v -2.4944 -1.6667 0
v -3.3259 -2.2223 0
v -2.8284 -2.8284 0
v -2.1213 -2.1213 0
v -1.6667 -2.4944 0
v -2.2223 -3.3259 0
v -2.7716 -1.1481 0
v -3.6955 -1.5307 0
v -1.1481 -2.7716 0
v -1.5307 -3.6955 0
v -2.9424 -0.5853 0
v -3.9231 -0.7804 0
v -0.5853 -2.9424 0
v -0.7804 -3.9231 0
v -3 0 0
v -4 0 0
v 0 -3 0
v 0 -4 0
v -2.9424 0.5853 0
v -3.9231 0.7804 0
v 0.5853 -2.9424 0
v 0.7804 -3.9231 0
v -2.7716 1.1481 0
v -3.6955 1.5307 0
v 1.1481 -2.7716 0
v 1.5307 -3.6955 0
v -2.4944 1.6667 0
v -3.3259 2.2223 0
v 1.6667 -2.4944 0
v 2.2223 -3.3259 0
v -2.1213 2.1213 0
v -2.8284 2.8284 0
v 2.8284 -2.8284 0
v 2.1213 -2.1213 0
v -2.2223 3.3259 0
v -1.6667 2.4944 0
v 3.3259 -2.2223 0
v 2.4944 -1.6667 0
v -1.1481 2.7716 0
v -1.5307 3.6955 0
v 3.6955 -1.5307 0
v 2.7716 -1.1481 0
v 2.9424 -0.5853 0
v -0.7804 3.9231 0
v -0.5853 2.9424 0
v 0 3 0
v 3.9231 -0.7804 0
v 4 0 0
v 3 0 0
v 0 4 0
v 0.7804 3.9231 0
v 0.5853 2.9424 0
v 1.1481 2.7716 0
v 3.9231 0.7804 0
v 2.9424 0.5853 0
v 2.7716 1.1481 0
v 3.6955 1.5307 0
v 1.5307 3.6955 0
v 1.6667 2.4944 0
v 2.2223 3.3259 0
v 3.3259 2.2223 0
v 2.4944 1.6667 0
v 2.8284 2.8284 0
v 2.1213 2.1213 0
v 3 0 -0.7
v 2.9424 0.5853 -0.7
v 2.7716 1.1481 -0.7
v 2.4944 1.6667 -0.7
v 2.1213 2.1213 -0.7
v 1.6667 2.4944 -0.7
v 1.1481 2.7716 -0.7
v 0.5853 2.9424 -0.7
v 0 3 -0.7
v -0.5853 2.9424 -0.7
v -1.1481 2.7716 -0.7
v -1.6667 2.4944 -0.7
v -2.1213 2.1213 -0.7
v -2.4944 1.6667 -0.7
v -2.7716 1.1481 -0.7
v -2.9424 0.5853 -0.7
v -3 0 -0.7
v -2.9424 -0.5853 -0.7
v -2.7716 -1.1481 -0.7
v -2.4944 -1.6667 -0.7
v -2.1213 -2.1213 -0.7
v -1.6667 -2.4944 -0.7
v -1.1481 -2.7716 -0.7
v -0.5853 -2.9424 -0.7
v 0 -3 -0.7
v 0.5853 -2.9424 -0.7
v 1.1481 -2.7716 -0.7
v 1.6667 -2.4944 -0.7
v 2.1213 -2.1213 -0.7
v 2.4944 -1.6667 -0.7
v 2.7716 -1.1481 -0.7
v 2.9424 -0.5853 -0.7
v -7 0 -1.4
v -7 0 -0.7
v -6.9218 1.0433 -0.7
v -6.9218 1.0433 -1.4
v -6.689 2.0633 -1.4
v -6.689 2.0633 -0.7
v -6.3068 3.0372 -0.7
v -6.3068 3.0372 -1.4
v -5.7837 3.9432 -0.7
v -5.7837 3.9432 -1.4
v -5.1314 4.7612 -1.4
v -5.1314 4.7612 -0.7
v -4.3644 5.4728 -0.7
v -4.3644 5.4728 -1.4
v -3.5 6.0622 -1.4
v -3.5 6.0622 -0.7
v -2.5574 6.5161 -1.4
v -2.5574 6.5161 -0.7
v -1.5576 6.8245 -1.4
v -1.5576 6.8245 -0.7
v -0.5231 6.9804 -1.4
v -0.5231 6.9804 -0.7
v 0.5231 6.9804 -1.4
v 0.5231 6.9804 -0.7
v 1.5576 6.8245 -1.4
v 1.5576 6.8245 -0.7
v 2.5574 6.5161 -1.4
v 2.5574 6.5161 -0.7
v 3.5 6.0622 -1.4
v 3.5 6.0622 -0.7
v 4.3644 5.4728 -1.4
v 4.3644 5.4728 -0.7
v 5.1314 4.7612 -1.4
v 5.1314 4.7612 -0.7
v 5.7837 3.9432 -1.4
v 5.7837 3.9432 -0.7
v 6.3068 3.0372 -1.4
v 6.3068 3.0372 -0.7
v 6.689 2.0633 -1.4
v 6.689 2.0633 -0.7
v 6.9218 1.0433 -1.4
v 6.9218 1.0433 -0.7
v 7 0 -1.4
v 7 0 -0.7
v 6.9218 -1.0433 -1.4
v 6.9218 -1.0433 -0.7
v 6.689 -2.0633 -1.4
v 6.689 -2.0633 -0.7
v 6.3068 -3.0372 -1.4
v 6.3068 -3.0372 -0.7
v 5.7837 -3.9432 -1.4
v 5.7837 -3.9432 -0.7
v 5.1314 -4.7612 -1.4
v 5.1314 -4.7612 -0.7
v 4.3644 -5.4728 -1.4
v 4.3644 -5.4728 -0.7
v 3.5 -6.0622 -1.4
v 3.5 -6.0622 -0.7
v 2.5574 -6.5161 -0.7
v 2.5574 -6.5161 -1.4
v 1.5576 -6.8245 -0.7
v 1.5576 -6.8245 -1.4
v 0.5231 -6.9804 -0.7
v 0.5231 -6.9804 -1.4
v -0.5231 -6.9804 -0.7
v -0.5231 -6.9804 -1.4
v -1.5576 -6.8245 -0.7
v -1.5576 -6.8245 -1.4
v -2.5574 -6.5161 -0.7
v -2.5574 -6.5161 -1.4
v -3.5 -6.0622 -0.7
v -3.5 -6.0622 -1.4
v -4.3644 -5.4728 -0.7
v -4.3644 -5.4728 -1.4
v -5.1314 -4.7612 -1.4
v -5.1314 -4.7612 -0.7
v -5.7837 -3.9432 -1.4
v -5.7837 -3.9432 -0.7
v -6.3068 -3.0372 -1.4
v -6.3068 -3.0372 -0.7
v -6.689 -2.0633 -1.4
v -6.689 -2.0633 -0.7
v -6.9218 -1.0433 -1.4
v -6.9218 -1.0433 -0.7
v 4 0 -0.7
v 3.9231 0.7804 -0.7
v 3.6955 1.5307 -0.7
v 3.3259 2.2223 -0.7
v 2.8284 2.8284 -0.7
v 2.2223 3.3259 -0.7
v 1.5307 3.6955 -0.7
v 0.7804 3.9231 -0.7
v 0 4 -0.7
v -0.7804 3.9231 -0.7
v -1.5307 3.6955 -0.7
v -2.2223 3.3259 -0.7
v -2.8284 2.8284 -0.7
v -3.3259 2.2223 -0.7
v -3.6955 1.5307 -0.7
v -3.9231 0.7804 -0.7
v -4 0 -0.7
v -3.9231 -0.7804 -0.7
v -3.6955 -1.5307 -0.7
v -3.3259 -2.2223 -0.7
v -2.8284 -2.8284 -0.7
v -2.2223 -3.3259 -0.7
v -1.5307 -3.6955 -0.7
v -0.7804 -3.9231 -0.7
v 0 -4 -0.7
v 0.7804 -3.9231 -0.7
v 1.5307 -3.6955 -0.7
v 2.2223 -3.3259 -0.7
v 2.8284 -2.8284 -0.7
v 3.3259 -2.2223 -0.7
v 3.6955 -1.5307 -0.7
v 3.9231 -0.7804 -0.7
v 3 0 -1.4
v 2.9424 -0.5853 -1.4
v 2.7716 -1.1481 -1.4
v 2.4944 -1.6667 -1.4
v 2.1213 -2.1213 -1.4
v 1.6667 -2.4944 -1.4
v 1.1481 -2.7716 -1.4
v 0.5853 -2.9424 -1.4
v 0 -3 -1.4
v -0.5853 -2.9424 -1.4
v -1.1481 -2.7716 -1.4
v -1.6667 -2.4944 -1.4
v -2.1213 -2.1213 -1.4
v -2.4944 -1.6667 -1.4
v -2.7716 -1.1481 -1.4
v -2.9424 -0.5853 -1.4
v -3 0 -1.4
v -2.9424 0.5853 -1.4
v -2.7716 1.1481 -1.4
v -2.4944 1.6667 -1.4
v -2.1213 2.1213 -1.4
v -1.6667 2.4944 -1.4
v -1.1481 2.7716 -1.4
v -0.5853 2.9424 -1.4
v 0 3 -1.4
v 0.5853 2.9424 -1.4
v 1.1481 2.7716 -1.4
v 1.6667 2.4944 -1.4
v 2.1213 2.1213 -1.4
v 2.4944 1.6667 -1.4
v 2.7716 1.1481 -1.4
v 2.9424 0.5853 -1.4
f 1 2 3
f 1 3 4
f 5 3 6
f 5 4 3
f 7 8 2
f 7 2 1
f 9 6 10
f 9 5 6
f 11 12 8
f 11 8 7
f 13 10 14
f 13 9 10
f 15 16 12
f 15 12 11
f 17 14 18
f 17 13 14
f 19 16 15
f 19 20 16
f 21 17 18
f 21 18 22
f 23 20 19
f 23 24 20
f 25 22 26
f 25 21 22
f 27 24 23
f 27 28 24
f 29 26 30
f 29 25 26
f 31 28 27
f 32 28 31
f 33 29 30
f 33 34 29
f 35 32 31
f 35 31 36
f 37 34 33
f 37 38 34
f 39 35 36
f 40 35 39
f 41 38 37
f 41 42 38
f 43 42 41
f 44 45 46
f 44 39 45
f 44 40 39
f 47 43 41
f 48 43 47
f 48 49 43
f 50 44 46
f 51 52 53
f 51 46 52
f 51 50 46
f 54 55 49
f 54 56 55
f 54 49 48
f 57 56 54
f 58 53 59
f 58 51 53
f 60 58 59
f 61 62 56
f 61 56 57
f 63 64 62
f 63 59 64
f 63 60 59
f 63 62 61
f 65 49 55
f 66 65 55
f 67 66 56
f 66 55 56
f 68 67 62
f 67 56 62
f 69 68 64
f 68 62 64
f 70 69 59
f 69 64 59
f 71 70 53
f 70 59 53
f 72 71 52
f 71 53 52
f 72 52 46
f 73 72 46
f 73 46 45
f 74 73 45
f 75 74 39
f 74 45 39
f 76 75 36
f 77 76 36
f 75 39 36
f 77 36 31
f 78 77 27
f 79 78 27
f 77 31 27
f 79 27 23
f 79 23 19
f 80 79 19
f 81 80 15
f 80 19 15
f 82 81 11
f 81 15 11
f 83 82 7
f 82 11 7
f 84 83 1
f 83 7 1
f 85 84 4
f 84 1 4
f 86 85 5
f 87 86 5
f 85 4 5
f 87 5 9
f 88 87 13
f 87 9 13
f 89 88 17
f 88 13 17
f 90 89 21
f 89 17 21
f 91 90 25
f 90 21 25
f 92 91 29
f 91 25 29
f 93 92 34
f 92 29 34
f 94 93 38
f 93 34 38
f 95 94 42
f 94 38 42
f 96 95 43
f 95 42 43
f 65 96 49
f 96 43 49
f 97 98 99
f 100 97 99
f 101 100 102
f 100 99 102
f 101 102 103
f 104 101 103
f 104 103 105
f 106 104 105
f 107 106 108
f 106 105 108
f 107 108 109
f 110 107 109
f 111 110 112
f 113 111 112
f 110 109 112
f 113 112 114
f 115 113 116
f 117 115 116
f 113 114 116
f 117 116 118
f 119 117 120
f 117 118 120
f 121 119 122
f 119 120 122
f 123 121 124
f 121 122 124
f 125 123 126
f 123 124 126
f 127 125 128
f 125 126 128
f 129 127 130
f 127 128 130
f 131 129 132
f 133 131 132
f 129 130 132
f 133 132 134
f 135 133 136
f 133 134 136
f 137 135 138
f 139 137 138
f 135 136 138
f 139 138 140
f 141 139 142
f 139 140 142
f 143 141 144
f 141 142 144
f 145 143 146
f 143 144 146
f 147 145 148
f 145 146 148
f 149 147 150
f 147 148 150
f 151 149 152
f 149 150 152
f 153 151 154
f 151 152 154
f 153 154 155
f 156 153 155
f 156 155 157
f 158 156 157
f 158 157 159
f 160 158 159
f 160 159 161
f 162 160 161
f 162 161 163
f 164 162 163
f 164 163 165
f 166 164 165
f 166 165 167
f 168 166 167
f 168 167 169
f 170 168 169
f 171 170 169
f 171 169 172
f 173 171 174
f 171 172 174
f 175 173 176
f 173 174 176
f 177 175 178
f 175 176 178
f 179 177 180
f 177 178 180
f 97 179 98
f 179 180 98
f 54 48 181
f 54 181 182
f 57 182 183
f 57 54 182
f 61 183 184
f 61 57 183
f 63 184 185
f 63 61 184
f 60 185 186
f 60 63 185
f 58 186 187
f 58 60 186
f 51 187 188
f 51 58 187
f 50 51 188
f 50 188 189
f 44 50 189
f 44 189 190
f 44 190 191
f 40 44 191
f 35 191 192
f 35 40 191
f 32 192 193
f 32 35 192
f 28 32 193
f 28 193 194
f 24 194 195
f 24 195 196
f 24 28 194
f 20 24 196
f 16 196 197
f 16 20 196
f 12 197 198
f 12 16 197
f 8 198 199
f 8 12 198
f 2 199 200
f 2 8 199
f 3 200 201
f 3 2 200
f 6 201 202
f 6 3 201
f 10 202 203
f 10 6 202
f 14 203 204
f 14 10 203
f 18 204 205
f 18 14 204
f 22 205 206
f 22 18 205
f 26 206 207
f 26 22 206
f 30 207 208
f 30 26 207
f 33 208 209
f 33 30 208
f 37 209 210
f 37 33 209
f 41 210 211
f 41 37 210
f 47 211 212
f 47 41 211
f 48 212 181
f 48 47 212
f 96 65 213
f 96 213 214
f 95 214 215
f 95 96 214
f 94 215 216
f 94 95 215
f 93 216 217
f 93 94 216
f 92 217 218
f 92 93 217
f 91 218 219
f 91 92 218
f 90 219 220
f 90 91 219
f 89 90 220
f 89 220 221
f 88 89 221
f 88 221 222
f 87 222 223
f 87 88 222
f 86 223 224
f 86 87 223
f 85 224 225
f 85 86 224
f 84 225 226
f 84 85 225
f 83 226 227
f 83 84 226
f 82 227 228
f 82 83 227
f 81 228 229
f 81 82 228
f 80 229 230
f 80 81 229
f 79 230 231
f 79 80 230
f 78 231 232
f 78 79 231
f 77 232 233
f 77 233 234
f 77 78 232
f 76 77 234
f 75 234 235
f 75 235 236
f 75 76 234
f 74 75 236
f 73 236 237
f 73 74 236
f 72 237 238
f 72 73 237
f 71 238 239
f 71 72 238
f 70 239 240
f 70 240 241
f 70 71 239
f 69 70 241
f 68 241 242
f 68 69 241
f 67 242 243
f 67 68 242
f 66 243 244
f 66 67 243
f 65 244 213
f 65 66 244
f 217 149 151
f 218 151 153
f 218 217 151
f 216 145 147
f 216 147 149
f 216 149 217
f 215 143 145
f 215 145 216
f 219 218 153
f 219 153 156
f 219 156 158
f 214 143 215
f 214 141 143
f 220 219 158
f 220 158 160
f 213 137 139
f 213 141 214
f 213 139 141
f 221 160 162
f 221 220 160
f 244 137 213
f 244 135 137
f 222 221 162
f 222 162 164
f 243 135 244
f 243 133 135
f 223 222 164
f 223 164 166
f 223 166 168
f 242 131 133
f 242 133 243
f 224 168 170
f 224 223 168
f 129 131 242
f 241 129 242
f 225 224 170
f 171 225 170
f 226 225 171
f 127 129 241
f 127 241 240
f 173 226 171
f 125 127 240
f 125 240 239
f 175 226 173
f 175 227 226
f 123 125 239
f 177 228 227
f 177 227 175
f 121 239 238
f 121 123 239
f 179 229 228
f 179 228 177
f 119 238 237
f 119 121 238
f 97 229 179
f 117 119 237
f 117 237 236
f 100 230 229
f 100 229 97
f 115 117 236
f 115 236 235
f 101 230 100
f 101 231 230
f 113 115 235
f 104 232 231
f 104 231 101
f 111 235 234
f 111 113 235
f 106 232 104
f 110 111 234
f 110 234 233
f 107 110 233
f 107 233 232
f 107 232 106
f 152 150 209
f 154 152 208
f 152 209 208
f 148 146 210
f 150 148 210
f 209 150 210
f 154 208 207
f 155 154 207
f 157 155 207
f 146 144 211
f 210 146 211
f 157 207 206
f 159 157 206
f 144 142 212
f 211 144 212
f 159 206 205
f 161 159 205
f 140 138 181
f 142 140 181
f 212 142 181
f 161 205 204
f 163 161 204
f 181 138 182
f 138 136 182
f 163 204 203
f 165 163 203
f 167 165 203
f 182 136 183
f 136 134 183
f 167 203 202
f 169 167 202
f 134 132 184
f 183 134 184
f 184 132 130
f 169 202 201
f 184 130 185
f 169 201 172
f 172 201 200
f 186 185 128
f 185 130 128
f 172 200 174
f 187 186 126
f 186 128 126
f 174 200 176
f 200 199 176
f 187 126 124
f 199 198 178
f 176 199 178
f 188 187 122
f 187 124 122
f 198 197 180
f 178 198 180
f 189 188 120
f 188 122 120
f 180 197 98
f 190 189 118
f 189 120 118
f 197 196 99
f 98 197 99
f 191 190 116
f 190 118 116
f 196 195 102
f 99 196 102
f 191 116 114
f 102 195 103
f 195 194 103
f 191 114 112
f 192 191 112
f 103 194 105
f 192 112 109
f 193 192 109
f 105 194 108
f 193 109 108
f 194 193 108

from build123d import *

# Parameters (mm, degrees)
SKETCH_1_R      = 4
SKETCH_1_R_2    = 3
EXTRUDE_1_DEPTH = 0.7
SKETCH_2_R      = 7
SKETCH_2_R_2    = 3
EXTRUDE_2_DEPTH = 0.7


with BuildPart() as part:
    # 草图1 → 凸台-拉伸1 (new body)
    with BuildSketch(Plane.XY):
        Circle(SKETCH_1_R)
        Circle(SKETCH_1_R_2, mode=Mode.SUBTRACT)
    extrude(amount=-EXTRUDE_1_DEPTH)

    # 草图2 → 凸台-拉伸2 (add)
    with BuildSketch(Plane(origin=(0, 0, -0.7), x_dir=(-1, 0, 0), z_dir=(0, 0, -1))):
        Circle(SKETCH_2_R)
        with Locations(Location((0, 0, 0), (0, 0, 180))):
            Circle(SKETCH_2_R_2, mode=Mode.SUBTRACT)
    extrude(amount=EXTRUDE_2_DEPTH)


solid = part.part
